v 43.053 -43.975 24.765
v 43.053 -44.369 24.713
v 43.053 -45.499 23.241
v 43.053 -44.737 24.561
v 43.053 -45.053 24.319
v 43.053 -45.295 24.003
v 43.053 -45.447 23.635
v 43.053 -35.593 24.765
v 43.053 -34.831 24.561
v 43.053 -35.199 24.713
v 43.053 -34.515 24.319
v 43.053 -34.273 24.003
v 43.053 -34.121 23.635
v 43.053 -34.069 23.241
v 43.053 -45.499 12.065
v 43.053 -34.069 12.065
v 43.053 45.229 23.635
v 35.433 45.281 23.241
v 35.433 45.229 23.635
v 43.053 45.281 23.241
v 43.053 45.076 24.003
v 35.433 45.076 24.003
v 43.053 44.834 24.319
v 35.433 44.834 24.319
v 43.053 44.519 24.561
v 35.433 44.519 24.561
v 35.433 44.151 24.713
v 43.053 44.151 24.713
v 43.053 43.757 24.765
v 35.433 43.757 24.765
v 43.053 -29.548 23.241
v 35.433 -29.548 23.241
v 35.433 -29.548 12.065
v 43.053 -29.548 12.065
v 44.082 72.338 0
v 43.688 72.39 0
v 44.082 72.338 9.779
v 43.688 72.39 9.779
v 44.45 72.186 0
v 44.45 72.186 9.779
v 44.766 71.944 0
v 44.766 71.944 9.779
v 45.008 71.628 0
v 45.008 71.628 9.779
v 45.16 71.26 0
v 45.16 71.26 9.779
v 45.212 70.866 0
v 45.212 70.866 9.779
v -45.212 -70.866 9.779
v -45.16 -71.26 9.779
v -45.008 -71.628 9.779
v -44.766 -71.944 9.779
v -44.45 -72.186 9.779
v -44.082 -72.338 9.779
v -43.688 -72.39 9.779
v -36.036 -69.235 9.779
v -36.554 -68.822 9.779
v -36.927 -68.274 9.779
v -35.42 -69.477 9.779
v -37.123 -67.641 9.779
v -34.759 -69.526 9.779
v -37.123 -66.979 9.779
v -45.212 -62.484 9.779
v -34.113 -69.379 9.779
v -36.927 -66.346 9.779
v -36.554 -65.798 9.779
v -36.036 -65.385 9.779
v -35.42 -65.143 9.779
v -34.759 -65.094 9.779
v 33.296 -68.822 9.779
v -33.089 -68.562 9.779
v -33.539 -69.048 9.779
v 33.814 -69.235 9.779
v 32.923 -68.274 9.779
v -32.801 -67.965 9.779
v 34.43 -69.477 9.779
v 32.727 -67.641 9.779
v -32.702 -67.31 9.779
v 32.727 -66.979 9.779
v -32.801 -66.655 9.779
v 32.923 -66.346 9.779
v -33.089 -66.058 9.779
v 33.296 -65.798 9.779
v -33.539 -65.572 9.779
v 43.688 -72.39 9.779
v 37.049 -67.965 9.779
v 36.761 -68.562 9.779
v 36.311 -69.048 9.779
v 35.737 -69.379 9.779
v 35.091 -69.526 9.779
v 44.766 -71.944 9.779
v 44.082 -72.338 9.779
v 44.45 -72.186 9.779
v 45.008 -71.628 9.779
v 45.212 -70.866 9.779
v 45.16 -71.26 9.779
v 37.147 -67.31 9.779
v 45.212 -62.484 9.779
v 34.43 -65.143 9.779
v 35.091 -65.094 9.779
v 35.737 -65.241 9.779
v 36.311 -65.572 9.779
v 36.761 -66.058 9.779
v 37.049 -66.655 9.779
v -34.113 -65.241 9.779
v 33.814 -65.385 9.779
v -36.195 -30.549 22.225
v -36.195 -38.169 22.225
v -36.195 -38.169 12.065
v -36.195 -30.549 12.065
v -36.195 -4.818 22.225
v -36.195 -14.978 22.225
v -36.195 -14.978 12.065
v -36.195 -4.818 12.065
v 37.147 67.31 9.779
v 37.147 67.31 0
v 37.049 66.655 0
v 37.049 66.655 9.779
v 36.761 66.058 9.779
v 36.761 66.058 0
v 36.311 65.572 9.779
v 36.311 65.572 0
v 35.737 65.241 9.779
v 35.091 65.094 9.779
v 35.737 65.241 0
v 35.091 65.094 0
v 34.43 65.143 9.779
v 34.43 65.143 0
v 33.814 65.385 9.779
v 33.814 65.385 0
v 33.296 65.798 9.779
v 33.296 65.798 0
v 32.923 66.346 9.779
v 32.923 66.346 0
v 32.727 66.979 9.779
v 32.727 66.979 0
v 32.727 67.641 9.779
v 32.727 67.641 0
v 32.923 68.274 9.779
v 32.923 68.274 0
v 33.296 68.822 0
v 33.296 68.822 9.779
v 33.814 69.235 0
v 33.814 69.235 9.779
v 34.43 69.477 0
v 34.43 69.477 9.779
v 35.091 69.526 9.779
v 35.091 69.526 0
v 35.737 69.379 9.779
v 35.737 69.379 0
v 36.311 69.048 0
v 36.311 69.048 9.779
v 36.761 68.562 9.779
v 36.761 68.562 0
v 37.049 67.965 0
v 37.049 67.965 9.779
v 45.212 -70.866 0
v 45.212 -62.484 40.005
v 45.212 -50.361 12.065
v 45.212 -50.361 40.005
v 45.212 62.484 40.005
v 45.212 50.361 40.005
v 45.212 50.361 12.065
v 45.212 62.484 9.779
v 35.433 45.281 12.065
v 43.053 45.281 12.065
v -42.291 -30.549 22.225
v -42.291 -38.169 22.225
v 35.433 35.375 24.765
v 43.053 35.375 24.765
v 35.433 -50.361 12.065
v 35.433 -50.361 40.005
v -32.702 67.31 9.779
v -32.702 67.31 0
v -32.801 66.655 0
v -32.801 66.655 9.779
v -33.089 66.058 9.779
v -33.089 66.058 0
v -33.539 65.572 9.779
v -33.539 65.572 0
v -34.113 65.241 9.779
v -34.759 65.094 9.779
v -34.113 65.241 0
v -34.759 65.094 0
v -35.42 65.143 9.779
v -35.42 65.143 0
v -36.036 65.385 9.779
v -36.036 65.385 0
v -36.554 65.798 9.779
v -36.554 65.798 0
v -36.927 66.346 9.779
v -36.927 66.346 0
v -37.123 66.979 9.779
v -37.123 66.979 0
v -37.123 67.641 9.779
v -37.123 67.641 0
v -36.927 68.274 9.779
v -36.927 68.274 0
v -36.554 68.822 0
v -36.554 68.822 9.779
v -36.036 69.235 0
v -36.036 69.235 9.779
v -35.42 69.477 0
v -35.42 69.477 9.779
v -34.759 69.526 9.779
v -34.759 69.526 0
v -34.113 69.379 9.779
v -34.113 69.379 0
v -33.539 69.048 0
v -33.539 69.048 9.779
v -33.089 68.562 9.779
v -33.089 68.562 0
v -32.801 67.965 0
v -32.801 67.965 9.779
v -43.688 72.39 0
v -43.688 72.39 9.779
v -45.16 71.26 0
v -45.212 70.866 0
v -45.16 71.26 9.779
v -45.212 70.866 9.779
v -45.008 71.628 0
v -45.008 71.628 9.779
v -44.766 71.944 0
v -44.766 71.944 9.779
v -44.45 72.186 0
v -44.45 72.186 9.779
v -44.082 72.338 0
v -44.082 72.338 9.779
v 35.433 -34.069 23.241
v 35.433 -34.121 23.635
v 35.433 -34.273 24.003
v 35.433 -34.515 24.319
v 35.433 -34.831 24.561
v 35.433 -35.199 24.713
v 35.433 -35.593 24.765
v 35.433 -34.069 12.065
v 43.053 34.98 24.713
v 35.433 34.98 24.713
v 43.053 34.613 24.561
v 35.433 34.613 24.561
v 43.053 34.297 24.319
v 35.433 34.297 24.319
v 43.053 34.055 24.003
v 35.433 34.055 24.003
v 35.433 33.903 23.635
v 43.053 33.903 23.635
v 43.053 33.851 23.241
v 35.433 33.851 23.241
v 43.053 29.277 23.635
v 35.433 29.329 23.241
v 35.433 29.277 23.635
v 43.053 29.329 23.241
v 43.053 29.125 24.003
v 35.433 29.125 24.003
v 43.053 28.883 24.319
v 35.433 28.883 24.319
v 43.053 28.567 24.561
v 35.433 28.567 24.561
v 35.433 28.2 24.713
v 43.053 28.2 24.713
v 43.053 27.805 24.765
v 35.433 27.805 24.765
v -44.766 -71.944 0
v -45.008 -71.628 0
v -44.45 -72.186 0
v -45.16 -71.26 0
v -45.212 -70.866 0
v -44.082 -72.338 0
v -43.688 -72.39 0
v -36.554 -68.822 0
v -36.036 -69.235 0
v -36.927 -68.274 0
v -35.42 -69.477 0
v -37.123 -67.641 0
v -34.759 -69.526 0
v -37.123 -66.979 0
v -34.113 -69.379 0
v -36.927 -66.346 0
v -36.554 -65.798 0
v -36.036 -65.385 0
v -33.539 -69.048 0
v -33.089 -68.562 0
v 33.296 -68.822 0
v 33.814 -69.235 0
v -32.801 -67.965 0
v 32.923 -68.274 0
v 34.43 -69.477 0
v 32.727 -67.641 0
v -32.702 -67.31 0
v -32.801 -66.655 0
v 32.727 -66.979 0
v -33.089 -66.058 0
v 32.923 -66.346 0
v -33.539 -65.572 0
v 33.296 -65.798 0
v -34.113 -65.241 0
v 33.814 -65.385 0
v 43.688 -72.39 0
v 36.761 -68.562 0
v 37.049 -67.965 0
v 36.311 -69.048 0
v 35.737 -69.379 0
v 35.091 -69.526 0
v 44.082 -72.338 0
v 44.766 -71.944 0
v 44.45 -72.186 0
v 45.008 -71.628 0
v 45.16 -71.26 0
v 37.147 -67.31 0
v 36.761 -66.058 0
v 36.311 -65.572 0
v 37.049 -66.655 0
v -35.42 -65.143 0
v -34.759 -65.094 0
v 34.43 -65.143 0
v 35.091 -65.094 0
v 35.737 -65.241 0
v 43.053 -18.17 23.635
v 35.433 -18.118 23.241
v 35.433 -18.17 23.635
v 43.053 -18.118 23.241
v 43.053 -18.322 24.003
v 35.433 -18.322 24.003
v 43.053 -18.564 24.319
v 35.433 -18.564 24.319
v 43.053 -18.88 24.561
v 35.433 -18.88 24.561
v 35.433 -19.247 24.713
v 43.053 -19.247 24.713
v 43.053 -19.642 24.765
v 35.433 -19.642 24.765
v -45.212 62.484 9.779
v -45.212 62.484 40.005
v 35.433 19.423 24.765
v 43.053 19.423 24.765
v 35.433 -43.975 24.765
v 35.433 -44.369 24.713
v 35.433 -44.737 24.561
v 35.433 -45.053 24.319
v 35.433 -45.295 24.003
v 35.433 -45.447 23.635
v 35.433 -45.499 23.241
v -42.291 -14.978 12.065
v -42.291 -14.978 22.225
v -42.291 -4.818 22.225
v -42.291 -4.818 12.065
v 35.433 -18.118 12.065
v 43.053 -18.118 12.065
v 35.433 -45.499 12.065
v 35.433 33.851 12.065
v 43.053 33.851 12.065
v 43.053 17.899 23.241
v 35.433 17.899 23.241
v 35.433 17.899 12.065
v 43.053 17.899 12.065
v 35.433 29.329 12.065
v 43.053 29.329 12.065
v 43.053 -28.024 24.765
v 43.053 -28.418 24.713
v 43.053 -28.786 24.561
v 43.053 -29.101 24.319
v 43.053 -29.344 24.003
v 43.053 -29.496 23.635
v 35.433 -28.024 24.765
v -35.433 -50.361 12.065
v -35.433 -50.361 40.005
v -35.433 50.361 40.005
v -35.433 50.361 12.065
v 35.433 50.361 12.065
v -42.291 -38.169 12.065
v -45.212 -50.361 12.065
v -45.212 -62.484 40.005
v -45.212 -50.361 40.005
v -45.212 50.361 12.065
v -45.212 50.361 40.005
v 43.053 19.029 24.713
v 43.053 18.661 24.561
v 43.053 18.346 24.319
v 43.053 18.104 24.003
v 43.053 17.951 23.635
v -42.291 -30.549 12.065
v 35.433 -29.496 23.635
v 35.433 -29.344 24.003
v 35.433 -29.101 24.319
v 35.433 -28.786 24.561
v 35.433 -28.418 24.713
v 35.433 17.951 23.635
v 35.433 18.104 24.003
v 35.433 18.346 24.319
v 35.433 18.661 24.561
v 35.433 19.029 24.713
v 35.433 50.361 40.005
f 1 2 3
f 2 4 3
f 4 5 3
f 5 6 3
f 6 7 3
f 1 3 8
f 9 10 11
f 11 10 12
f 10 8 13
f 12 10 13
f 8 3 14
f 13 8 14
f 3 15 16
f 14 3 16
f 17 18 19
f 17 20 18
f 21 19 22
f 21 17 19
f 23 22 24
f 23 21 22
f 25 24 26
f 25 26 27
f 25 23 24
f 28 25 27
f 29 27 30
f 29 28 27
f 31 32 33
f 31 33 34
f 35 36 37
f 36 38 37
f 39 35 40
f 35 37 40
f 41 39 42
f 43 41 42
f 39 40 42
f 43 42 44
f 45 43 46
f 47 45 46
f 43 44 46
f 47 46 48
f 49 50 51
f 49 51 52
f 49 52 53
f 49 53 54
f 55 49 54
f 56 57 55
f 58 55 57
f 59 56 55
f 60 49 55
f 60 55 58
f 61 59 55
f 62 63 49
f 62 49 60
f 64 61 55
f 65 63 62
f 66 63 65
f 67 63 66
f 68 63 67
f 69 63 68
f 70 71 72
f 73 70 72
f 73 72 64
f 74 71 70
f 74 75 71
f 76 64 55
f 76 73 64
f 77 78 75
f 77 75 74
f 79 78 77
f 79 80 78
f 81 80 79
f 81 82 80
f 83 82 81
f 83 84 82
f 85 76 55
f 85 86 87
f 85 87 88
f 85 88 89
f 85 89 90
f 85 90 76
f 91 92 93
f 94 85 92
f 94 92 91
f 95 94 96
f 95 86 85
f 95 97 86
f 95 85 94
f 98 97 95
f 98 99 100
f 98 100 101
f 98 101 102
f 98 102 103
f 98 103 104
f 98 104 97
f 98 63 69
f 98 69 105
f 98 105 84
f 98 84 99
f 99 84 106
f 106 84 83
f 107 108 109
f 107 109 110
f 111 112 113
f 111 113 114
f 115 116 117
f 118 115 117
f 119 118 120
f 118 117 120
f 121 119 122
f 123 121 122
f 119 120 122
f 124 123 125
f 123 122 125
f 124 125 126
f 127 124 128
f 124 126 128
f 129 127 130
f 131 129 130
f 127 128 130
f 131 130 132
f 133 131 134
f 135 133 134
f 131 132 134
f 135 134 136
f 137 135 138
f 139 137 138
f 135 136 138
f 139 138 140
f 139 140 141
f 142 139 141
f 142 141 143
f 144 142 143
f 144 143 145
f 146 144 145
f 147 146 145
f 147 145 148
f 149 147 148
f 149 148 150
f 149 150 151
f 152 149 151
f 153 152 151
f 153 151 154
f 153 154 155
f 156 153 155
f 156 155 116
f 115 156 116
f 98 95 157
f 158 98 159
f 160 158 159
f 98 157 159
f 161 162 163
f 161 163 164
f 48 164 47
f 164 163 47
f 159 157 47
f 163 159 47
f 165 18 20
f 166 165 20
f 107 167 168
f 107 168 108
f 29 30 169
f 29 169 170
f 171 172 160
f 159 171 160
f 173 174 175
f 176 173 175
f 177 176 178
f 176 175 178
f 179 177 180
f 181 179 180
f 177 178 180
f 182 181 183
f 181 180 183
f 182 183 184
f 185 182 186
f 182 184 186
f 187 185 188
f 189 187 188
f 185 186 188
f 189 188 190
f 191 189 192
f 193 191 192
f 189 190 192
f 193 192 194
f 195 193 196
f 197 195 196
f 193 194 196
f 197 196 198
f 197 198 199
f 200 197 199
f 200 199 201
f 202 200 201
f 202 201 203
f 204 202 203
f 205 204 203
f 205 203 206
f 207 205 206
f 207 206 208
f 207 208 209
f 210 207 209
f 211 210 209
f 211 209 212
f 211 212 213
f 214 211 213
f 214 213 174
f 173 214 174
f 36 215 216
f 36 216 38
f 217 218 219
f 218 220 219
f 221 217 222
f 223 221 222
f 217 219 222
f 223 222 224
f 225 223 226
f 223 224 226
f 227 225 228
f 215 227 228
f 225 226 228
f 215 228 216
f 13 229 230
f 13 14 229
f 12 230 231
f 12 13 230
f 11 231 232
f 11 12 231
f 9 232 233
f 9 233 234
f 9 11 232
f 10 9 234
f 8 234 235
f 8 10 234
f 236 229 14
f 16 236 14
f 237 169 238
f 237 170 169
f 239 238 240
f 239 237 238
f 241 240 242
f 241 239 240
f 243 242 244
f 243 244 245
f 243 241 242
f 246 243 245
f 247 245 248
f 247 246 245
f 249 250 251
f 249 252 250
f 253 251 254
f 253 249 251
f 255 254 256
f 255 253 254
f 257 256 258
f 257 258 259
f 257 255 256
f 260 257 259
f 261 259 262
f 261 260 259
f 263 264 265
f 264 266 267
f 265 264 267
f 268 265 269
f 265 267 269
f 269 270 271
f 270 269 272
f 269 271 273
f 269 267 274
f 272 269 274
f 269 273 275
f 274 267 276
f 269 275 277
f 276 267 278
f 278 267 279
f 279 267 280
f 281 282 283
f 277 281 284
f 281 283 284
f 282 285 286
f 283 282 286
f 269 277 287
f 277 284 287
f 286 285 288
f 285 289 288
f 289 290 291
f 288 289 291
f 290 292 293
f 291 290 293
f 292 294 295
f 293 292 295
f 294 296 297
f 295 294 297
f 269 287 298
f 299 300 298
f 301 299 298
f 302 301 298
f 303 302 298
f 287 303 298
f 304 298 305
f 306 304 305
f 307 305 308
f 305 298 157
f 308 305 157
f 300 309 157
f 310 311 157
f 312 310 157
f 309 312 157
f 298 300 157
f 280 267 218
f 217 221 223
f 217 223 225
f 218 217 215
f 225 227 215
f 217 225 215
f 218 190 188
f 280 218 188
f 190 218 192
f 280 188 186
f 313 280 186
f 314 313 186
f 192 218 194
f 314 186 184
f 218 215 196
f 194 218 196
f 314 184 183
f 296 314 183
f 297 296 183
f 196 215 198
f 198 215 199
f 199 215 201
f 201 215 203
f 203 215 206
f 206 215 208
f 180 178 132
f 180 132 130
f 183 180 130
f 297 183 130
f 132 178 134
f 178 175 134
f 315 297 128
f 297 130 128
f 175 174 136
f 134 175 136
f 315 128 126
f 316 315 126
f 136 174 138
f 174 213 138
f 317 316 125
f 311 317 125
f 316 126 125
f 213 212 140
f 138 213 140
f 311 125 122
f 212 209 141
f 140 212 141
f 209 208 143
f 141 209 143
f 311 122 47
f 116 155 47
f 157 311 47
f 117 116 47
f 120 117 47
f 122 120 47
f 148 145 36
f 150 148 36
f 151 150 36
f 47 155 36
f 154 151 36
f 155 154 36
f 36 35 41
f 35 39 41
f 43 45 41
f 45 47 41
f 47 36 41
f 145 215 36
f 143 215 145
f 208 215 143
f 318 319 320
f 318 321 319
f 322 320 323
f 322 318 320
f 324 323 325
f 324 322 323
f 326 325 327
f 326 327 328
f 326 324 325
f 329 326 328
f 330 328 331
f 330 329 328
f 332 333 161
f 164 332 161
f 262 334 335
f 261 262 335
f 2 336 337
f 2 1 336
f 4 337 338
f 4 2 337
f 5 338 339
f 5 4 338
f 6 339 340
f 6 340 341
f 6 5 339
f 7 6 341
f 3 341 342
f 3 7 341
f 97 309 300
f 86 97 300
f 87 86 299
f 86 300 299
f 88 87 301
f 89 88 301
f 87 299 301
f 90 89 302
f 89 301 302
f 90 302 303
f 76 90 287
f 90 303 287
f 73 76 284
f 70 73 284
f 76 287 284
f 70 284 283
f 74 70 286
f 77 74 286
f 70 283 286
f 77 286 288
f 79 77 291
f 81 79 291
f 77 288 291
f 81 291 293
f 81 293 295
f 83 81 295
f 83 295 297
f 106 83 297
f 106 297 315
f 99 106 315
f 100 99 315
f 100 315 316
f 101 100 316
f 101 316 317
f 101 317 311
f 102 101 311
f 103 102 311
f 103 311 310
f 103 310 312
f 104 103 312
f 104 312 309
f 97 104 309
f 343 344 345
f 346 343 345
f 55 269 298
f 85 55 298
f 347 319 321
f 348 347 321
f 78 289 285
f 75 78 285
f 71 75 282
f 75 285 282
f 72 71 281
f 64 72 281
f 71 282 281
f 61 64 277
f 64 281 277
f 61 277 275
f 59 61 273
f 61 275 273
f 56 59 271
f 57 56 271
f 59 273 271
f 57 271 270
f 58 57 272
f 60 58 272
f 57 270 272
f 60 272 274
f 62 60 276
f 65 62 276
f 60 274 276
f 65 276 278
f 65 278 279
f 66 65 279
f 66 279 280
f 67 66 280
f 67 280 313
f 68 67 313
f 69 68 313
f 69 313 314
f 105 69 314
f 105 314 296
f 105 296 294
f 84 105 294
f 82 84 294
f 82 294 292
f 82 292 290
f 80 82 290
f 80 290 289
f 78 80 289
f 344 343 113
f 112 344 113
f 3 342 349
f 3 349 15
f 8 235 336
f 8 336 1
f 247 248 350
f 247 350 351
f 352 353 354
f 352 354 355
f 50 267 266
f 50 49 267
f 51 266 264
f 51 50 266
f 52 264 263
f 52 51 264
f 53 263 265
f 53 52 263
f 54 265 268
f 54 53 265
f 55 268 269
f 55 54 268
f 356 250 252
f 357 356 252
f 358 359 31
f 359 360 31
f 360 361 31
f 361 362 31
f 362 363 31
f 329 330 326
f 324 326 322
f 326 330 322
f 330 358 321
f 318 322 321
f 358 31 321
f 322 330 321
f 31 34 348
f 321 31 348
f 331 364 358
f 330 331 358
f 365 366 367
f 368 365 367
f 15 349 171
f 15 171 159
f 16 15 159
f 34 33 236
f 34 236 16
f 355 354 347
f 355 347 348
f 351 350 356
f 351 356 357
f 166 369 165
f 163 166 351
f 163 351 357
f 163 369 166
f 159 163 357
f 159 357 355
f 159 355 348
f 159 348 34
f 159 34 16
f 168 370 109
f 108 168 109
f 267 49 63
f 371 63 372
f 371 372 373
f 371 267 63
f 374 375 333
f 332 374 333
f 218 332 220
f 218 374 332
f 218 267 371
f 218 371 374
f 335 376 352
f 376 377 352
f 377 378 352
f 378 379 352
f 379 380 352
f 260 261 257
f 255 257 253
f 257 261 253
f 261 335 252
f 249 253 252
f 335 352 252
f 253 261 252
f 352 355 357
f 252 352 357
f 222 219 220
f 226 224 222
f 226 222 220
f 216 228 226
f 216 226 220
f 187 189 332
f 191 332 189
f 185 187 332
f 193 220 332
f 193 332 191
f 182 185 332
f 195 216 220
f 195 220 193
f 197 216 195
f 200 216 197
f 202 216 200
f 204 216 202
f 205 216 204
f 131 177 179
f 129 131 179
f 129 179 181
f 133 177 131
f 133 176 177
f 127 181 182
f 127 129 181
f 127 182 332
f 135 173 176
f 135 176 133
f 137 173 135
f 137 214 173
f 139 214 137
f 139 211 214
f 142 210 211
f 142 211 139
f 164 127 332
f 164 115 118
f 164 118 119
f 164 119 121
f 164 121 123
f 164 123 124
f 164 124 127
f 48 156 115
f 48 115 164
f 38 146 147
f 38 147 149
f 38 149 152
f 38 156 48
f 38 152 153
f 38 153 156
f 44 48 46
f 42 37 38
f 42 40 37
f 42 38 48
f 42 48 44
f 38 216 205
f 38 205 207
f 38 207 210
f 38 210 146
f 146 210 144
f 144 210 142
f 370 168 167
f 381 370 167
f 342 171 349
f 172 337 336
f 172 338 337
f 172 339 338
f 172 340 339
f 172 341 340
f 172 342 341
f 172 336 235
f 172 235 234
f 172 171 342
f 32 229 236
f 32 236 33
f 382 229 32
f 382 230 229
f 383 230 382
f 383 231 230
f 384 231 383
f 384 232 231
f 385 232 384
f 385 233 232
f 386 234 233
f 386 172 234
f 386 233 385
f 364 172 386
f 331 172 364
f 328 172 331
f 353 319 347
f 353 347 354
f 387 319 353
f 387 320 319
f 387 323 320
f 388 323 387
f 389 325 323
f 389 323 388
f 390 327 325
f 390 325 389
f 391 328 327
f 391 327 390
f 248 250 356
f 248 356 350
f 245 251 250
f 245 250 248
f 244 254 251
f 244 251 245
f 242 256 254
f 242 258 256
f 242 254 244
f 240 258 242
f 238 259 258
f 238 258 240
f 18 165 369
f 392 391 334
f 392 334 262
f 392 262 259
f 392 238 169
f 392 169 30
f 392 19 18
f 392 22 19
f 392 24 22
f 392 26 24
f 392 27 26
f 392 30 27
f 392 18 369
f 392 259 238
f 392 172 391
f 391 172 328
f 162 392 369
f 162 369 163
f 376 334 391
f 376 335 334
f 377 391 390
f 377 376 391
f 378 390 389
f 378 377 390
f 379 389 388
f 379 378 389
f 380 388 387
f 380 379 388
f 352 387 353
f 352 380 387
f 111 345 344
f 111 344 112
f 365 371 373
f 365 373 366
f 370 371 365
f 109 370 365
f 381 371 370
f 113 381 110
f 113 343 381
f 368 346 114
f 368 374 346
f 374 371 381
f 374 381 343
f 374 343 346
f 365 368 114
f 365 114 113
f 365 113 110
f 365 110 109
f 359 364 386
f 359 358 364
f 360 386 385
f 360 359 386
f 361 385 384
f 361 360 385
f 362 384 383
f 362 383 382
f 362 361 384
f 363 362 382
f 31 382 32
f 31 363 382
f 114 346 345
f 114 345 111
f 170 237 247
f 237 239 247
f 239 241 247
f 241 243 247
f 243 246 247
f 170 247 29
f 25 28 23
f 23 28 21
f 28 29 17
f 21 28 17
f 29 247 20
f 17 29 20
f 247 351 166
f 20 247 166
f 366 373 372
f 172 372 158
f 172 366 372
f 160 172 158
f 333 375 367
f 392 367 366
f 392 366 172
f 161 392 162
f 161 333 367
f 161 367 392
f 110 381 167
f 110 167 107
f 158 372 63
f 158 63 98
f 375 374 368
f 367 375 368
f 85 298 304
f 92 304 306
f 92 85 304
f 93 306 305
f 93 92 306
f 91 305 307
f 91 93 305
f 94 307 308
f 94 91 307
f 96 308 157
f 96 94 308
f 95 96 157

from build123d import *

# Parameters (mm, degrees)
F0_W      = 90.424
F0_H      = 144.78
F1_DEPTH  = 40.005
F2_W      = 155.254013
F2_H      = 39.959349
F2_W_2    = 138.807609
F2_H_2    = 17.542356
F3_DEPTH  = 30.226
F4_R      = 1.524
F5_R      = 2.2225
F6_DEPTH  = 25.4
F7_W      = 25.824266
F7_H      = 100.72116
F8_DEPTH  = 27.94
F9_W      = 7.62
F9_H      = 11.43
F10_DEPTH = 12.7
F11_R     = 1.524
F12_W     = 6.096
F12_H     = 7.62
F12_H_2   = 10.16
F13_DEPTH = 10.16


with BuildPart() as f1:
    # F0 (on Top) → F1 (new body)
    with BuildSketch(Plane.XY):
        Rectangle(F0_W, F0_H)
    extrude(amount=F1_DEPTH)

    # F2 (on face) → F3 (cut)
    with BuildSketch(Plane.XY.offset(40.005)):
        with Locations((-0.908692, -82.463674)):
            Rectangle(F2_W, F2_H)
        with Locations((-0.57976, 71.255178)):
            Rectangle(F2_W_2, F2_H_2)
    extrude(amount=-F3_DEPTH, mode=Mode.SUBTRACT)

    # F4
    f4_edges = [f1.edges().sort_by_distance(p)[0] for p in [
        (45.212, -72.39, 4.8895),
        (-45.212, -72.39, 4.8895),
        (45.212, 72.39, 4.8895),
        (-45.212, 72.39, 4.8895),
    ]]
    fillet(f4_edges, radius=F4_R)

    # F5 (on face) → F6 (cut)
    with BuildSketch(Plane(origin=(0, 0, 0), x_dir=(1, 0, 0), z_dir=(0, 0, -1))):
        with Locations((-34.925, 67.31)):
            Circle(F5_R)
        with Locations((34.925, 67.31)):
            Circle(F5_R)
        with Locations((34.925, -67.31)):
            Circle(F5_R)
        with Locations((-34.925, -67.31)):
            Circle(F5_R)
    extrude(amount=-F6_DEPTH, mode=Mode.SUBTRACT)

    # F7 (on face) → F8 (cut)
    with BuildSketch(Plane.XY.offset(40.005)):
        with Locations((-48.345133, 0)):
            Rectangle(F7_W, F7_H)
        with Locations((48.345133, 0)):
            Rectangle(F7_W, F7_H)
    extrude(amount=-F8_DEPTH, mode=Mode.SUBTRACT)

    # F9 (on face) → F10 (join)
    with BuildSketch(Plane.XY.offset(12.065)):
        with Locations((39.243, 39.56558)):
            Rectangle(F9_W, F9_H)
        with Locations((39.243, 23.61438)):
            Rectangle(F9_W, F9_H)
        with Locations((39.243, -23.83282)):
            Rectangle(F9_W, F9_H)
        with Locations((39.243, -39.78402)):
            Rectangle(F9_W, F9_H)
    extrude(amount=F10_DEPTH)

    # F11
    f11_edges = [f1.edges().sort_by_distance(p)[0] for p in [
        (39.243, -45.49902, 24.765),
        (39.243, -34.06902, 24.765),
        (39.243, -29.54782, 24.765),
        (39.243, -18.11782, 24.765),
        (39.243, 17.89938, 24.765),
        (39.243, 33.85058, 24.765),
        (39.243, 29.32938, 24.765),
        (39.243, 45.28058, 24.765),
    ]]
    fillet(f11_edges, radius=F11_R)

    # F12 (on face) → F13 (join)
    with BuildSketch(Plane.XY.offset(12.065)):
        with Locations((-39.243, -34.35858)):
            Rectangle(F12_W, F12_H)
        with Locations((-39.243, -9.89838)):
            Rectangle(F12_W, F12_H_2)
    extrude(amount=F13_DEPTH)


solid = f1.part
